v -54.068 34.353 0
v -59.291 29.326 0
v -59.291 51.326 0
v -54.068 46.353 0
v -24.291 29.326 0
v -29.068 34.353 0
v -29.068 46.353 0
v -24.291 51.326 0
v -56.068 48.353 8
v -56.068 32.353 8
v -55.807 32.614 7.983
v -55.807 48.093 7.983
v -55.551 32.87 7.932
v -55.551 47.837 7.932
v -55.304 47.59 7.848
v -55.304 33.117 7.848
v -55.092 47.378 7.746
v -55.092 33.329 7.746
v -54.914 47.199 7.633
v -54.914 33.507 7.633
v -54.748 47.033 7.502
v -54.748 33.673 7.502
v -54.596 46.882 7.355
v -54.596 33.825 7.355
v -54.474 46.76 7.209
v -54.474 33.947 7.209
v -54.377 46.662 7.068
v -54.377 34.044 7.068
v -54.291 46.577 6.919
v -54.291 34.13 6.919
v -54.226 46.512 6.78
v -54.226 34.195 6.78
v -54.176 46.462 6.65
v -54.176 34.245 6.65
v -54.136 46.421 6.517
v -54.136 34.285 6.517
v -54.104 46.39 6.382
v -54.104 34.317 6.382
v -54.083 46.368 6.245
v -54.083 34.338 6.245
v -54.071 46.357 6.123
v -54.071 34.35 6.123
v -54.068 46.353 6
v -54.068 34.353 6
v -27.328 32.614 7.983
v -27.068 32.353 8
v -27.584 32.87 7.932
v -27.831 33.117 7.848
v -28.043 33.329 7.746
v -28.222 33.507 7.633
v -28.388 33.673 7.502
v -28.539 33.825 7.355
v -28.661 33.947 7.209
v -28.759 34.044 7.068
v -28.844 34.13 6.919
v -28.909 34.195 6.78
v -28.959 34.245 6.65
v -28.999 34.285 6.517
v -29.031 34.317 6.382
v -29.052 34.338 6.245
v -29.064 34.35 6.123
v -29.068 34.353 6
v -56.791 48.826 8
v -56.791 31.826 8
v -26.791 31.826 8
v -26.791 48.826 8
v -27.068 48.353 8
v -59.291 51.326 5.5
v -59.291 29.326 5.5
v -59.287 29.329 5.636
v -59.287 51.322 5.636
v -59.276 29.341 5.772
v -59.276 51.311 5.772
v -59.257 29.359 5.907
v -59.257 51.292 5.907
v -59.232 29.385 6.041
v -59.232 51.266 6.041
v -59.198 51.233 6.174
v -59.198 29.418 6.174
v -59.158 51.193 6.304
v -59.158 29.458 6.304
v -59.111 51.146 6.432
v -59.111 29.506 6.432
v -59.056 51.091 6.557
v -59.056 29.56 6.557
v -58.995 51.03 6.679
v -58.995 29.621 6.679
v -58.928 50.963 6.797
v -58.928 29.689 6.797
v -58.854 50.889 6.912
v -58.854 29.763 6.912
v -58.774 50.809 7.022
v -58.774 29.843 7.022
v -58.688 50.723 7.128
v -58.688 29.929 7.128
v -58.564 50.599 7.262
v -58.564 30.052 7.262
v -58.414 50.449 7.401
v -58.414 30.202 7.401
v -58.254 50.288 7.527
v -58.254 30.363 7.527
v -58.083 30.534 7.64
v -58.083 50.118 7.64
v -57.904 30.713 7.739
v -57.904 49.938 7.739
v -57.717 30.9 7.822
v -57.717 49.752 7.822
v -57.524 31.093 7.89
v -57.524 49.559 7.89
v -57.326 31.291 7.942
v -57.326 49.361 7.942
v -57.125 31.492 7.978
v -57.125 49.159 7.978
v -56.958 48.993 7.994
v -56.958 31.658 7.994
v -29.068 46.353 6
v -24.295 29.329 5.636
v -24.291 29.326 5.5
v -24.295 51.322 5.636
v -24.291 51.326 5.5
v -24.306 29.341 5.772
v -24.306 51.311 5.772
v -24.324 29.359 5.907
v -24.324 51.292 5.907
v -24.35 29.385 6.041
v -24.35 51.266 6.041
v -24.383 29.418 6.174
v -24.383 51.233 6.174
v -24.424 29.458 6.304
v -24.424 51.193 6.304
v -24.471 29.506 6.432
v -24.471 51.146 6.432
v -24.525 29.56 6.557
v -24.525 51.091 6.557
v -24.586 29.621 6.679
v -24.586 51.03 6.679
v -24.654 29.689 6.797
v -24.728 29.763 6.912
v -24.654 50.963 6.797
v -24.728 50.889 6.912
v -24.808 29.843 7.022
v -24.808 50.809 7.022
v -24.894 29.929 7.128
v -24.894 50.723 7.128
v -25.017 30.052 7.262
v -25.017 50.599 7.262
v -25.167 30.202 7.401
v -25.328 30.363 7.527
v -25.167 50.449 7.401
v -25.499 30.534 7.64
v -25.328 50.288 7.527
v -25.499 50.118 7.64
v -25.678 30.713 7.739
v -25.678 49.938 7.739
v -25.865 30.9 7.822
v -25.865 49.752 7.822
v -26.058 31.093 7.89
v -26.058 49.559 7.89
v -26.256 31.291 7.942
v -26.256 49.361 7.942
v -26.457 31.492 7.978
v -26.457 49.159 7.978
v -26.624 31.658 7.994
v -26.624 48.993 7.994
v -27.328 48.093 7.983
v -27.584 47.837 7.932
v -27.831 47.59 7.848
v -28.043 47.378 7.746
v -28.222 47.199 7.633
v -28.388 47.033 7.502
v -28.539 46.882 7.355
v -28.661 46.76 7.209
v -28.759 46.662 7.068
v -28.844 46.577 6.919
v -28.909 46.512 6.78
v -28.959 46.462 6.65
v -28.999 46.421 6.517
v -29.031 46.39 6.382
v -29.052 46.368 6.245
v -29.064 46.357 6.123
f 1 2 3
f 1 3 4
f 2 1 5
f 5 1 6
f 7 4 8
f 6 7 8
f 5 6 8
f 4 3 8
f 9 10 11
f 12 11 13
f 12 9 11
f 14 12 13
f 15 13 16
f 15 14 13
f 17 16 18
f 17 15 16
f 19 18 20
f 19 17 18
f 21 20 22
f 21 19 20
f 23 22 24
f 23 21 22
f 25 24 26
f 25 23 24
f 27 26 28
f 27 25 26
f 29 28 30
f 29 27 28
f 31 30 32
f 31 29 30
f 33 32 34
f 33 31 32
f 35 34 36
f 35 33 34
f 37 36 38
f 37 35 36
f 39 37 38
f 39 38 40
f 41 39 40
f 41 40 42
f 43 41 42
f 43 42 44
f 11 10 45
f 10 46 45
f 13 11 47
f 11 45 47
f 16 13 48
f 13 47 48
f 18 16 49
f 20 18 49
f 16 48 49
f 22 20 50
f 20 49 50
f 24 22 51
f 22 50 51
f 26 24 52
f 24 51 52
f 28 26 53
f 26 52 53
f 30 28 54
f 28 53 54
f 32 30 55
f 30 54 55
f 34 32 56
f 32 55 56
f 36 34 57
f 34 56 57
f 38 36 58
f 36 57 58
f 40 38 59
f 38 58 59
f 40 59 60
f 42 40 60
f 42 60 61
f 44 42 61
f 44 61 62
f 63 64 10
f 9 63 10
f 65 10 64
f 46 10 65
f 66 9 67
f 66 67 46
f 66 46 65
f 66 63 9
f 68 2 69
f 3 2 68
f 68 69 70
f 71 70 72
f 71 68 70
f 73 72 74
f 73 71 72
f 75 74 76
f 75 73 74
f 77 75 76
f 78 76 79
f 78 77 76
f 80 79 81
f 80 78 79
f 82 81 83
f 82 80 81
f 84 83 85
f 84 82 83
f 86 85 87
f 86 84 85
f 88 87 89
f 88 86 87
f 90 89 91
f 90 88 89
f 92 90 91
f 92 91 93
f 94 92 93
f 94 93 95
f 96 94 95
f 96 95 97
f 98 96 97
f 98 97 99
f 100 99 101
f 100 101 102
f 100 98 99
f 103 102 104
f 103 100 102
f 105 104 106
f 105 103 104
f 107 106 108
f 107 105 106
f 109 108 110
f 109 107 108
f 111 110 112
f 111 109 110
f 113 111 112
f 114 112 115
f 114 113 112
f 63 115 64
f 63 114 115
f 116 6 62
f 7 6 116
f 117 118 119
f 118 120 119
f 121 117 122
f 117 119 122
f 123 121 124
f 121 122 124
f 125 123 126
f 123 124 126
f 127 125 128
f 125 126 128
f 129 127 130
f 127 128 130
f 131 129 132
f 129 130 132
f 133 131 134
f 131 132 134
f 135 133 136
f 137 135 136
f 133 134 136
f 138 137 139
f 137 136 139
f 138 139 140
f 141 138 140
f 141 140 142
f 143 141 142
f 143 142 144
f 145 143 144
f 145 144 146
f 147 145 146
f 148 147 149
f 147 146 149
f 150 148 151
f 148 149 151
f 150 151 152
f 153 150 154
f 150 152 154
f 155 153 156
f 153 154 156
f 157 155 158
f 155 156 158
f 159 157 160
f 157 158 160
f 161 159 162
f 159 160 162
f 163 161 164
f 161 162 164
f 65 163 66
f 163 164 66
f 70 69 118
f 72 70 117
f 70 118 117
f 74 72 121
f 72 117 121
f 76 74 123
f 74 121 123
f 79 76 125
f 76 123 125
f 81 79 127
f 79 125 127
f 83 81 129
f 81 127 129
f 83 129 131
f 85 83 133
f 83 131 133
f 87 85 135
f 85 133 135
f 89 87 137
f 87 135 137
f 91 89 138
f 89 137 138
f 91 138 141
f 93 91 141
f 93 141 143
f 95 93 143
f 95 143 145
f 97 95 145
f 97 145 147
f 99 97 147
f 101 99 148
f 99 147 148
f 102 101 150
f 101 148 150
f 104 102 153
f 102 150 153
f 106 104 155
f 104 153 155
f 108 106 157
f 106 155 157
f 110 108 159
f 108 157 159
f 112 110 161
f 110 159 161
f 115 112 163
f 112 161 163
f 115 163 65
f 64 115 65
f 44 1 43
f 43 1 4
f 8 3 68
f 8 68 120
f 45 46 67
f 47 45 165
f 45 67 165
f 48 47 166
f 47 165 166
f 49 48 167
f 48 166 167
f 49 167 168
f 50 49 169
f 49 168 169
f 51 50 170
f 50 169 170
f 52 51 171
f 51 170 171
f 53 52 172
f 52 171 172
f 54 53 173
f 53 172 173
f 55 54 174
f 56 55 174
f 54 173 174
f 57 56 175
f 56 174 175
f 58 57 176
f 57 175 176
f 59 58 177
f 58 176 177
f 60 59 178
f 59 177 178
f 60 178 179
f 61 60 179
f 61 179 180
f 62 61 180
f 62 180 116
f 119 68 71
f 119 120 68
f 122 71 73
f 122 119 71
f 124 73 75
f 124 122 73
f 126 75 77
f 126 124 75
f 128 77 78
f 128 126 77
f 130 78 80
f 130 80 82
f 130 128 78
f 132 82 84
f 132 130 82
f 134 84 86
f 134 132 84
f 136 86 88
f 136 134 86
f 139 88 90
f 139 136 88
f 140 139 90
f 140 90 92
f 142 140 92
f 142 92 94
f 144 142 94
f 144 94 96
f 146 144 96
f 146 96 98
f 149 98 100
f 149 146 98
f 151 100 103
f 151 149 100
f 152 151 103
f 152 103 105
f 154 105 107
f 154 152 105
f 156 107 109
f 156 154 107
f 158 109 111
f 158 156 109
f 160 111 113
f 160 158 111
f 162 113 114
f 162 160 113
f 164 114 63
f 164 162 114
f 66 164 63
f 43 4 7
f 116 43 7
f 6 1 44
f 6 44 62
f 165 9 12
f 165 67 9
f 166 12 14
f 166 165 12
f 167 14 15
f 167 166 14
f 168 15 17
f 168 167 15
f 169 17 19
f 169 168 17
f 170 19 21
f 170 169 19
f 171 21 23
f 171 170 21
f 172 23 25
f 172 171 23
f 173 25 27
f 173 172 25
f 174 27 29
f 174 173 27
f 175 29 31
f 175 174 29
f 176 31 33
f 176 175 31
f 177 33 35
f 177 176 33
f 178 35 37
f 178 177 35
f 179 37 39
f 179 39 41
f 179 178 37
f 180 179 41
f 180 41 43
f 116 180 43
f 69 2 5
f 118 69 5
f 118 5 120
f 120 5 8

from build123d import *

# Parameters (mm, degrees)
F0_W     = 35
F0_H     = 22
F0_W_2   = 25
F0_H_2   = 12
F1_DEPTH = 8
F2_R     = 2.5
F3_R     = 2


with BuildPart() as f1:
    # F0 (on Top) → F1 (new body)
    with BuildSketch(Plane.XY):
        with Locations((-41.790893, 40.325698)):
            Rectangle(F0_W, F0_H)
        with Locations((-41.567577, 40.353398)):
            Rectangle(F0_W_2, F0_H_2, mode=Mode.SUBTRACT)
    extrude(amount=F1_DEPTH)

    # F2
    f2_edges = [f1.edges().sort_by_distance(p)[0] for p in [
        (-41.790893, 29.325698, 8),
        (-59.290893, 40.325698, 8),
        (-41.790893, 51.325698, 8),
        (-24.290893, 40.325698, 8),
    ]]
    fillet(f2_edges, radius=F2_R)

    # F3
    f3_edges = [f1.edges().sort_by_distance(p)[0] for p in [
        (-41.567577, 46.353398, 8),
        (-54.067577, 40.353398, 8),
        (-41.567577, 34.353398, 8),
        (-29.067577, 40.353398, 8),
    ]]
    fillet(f3_edges, radius=F3_R)


solid = f1.part
